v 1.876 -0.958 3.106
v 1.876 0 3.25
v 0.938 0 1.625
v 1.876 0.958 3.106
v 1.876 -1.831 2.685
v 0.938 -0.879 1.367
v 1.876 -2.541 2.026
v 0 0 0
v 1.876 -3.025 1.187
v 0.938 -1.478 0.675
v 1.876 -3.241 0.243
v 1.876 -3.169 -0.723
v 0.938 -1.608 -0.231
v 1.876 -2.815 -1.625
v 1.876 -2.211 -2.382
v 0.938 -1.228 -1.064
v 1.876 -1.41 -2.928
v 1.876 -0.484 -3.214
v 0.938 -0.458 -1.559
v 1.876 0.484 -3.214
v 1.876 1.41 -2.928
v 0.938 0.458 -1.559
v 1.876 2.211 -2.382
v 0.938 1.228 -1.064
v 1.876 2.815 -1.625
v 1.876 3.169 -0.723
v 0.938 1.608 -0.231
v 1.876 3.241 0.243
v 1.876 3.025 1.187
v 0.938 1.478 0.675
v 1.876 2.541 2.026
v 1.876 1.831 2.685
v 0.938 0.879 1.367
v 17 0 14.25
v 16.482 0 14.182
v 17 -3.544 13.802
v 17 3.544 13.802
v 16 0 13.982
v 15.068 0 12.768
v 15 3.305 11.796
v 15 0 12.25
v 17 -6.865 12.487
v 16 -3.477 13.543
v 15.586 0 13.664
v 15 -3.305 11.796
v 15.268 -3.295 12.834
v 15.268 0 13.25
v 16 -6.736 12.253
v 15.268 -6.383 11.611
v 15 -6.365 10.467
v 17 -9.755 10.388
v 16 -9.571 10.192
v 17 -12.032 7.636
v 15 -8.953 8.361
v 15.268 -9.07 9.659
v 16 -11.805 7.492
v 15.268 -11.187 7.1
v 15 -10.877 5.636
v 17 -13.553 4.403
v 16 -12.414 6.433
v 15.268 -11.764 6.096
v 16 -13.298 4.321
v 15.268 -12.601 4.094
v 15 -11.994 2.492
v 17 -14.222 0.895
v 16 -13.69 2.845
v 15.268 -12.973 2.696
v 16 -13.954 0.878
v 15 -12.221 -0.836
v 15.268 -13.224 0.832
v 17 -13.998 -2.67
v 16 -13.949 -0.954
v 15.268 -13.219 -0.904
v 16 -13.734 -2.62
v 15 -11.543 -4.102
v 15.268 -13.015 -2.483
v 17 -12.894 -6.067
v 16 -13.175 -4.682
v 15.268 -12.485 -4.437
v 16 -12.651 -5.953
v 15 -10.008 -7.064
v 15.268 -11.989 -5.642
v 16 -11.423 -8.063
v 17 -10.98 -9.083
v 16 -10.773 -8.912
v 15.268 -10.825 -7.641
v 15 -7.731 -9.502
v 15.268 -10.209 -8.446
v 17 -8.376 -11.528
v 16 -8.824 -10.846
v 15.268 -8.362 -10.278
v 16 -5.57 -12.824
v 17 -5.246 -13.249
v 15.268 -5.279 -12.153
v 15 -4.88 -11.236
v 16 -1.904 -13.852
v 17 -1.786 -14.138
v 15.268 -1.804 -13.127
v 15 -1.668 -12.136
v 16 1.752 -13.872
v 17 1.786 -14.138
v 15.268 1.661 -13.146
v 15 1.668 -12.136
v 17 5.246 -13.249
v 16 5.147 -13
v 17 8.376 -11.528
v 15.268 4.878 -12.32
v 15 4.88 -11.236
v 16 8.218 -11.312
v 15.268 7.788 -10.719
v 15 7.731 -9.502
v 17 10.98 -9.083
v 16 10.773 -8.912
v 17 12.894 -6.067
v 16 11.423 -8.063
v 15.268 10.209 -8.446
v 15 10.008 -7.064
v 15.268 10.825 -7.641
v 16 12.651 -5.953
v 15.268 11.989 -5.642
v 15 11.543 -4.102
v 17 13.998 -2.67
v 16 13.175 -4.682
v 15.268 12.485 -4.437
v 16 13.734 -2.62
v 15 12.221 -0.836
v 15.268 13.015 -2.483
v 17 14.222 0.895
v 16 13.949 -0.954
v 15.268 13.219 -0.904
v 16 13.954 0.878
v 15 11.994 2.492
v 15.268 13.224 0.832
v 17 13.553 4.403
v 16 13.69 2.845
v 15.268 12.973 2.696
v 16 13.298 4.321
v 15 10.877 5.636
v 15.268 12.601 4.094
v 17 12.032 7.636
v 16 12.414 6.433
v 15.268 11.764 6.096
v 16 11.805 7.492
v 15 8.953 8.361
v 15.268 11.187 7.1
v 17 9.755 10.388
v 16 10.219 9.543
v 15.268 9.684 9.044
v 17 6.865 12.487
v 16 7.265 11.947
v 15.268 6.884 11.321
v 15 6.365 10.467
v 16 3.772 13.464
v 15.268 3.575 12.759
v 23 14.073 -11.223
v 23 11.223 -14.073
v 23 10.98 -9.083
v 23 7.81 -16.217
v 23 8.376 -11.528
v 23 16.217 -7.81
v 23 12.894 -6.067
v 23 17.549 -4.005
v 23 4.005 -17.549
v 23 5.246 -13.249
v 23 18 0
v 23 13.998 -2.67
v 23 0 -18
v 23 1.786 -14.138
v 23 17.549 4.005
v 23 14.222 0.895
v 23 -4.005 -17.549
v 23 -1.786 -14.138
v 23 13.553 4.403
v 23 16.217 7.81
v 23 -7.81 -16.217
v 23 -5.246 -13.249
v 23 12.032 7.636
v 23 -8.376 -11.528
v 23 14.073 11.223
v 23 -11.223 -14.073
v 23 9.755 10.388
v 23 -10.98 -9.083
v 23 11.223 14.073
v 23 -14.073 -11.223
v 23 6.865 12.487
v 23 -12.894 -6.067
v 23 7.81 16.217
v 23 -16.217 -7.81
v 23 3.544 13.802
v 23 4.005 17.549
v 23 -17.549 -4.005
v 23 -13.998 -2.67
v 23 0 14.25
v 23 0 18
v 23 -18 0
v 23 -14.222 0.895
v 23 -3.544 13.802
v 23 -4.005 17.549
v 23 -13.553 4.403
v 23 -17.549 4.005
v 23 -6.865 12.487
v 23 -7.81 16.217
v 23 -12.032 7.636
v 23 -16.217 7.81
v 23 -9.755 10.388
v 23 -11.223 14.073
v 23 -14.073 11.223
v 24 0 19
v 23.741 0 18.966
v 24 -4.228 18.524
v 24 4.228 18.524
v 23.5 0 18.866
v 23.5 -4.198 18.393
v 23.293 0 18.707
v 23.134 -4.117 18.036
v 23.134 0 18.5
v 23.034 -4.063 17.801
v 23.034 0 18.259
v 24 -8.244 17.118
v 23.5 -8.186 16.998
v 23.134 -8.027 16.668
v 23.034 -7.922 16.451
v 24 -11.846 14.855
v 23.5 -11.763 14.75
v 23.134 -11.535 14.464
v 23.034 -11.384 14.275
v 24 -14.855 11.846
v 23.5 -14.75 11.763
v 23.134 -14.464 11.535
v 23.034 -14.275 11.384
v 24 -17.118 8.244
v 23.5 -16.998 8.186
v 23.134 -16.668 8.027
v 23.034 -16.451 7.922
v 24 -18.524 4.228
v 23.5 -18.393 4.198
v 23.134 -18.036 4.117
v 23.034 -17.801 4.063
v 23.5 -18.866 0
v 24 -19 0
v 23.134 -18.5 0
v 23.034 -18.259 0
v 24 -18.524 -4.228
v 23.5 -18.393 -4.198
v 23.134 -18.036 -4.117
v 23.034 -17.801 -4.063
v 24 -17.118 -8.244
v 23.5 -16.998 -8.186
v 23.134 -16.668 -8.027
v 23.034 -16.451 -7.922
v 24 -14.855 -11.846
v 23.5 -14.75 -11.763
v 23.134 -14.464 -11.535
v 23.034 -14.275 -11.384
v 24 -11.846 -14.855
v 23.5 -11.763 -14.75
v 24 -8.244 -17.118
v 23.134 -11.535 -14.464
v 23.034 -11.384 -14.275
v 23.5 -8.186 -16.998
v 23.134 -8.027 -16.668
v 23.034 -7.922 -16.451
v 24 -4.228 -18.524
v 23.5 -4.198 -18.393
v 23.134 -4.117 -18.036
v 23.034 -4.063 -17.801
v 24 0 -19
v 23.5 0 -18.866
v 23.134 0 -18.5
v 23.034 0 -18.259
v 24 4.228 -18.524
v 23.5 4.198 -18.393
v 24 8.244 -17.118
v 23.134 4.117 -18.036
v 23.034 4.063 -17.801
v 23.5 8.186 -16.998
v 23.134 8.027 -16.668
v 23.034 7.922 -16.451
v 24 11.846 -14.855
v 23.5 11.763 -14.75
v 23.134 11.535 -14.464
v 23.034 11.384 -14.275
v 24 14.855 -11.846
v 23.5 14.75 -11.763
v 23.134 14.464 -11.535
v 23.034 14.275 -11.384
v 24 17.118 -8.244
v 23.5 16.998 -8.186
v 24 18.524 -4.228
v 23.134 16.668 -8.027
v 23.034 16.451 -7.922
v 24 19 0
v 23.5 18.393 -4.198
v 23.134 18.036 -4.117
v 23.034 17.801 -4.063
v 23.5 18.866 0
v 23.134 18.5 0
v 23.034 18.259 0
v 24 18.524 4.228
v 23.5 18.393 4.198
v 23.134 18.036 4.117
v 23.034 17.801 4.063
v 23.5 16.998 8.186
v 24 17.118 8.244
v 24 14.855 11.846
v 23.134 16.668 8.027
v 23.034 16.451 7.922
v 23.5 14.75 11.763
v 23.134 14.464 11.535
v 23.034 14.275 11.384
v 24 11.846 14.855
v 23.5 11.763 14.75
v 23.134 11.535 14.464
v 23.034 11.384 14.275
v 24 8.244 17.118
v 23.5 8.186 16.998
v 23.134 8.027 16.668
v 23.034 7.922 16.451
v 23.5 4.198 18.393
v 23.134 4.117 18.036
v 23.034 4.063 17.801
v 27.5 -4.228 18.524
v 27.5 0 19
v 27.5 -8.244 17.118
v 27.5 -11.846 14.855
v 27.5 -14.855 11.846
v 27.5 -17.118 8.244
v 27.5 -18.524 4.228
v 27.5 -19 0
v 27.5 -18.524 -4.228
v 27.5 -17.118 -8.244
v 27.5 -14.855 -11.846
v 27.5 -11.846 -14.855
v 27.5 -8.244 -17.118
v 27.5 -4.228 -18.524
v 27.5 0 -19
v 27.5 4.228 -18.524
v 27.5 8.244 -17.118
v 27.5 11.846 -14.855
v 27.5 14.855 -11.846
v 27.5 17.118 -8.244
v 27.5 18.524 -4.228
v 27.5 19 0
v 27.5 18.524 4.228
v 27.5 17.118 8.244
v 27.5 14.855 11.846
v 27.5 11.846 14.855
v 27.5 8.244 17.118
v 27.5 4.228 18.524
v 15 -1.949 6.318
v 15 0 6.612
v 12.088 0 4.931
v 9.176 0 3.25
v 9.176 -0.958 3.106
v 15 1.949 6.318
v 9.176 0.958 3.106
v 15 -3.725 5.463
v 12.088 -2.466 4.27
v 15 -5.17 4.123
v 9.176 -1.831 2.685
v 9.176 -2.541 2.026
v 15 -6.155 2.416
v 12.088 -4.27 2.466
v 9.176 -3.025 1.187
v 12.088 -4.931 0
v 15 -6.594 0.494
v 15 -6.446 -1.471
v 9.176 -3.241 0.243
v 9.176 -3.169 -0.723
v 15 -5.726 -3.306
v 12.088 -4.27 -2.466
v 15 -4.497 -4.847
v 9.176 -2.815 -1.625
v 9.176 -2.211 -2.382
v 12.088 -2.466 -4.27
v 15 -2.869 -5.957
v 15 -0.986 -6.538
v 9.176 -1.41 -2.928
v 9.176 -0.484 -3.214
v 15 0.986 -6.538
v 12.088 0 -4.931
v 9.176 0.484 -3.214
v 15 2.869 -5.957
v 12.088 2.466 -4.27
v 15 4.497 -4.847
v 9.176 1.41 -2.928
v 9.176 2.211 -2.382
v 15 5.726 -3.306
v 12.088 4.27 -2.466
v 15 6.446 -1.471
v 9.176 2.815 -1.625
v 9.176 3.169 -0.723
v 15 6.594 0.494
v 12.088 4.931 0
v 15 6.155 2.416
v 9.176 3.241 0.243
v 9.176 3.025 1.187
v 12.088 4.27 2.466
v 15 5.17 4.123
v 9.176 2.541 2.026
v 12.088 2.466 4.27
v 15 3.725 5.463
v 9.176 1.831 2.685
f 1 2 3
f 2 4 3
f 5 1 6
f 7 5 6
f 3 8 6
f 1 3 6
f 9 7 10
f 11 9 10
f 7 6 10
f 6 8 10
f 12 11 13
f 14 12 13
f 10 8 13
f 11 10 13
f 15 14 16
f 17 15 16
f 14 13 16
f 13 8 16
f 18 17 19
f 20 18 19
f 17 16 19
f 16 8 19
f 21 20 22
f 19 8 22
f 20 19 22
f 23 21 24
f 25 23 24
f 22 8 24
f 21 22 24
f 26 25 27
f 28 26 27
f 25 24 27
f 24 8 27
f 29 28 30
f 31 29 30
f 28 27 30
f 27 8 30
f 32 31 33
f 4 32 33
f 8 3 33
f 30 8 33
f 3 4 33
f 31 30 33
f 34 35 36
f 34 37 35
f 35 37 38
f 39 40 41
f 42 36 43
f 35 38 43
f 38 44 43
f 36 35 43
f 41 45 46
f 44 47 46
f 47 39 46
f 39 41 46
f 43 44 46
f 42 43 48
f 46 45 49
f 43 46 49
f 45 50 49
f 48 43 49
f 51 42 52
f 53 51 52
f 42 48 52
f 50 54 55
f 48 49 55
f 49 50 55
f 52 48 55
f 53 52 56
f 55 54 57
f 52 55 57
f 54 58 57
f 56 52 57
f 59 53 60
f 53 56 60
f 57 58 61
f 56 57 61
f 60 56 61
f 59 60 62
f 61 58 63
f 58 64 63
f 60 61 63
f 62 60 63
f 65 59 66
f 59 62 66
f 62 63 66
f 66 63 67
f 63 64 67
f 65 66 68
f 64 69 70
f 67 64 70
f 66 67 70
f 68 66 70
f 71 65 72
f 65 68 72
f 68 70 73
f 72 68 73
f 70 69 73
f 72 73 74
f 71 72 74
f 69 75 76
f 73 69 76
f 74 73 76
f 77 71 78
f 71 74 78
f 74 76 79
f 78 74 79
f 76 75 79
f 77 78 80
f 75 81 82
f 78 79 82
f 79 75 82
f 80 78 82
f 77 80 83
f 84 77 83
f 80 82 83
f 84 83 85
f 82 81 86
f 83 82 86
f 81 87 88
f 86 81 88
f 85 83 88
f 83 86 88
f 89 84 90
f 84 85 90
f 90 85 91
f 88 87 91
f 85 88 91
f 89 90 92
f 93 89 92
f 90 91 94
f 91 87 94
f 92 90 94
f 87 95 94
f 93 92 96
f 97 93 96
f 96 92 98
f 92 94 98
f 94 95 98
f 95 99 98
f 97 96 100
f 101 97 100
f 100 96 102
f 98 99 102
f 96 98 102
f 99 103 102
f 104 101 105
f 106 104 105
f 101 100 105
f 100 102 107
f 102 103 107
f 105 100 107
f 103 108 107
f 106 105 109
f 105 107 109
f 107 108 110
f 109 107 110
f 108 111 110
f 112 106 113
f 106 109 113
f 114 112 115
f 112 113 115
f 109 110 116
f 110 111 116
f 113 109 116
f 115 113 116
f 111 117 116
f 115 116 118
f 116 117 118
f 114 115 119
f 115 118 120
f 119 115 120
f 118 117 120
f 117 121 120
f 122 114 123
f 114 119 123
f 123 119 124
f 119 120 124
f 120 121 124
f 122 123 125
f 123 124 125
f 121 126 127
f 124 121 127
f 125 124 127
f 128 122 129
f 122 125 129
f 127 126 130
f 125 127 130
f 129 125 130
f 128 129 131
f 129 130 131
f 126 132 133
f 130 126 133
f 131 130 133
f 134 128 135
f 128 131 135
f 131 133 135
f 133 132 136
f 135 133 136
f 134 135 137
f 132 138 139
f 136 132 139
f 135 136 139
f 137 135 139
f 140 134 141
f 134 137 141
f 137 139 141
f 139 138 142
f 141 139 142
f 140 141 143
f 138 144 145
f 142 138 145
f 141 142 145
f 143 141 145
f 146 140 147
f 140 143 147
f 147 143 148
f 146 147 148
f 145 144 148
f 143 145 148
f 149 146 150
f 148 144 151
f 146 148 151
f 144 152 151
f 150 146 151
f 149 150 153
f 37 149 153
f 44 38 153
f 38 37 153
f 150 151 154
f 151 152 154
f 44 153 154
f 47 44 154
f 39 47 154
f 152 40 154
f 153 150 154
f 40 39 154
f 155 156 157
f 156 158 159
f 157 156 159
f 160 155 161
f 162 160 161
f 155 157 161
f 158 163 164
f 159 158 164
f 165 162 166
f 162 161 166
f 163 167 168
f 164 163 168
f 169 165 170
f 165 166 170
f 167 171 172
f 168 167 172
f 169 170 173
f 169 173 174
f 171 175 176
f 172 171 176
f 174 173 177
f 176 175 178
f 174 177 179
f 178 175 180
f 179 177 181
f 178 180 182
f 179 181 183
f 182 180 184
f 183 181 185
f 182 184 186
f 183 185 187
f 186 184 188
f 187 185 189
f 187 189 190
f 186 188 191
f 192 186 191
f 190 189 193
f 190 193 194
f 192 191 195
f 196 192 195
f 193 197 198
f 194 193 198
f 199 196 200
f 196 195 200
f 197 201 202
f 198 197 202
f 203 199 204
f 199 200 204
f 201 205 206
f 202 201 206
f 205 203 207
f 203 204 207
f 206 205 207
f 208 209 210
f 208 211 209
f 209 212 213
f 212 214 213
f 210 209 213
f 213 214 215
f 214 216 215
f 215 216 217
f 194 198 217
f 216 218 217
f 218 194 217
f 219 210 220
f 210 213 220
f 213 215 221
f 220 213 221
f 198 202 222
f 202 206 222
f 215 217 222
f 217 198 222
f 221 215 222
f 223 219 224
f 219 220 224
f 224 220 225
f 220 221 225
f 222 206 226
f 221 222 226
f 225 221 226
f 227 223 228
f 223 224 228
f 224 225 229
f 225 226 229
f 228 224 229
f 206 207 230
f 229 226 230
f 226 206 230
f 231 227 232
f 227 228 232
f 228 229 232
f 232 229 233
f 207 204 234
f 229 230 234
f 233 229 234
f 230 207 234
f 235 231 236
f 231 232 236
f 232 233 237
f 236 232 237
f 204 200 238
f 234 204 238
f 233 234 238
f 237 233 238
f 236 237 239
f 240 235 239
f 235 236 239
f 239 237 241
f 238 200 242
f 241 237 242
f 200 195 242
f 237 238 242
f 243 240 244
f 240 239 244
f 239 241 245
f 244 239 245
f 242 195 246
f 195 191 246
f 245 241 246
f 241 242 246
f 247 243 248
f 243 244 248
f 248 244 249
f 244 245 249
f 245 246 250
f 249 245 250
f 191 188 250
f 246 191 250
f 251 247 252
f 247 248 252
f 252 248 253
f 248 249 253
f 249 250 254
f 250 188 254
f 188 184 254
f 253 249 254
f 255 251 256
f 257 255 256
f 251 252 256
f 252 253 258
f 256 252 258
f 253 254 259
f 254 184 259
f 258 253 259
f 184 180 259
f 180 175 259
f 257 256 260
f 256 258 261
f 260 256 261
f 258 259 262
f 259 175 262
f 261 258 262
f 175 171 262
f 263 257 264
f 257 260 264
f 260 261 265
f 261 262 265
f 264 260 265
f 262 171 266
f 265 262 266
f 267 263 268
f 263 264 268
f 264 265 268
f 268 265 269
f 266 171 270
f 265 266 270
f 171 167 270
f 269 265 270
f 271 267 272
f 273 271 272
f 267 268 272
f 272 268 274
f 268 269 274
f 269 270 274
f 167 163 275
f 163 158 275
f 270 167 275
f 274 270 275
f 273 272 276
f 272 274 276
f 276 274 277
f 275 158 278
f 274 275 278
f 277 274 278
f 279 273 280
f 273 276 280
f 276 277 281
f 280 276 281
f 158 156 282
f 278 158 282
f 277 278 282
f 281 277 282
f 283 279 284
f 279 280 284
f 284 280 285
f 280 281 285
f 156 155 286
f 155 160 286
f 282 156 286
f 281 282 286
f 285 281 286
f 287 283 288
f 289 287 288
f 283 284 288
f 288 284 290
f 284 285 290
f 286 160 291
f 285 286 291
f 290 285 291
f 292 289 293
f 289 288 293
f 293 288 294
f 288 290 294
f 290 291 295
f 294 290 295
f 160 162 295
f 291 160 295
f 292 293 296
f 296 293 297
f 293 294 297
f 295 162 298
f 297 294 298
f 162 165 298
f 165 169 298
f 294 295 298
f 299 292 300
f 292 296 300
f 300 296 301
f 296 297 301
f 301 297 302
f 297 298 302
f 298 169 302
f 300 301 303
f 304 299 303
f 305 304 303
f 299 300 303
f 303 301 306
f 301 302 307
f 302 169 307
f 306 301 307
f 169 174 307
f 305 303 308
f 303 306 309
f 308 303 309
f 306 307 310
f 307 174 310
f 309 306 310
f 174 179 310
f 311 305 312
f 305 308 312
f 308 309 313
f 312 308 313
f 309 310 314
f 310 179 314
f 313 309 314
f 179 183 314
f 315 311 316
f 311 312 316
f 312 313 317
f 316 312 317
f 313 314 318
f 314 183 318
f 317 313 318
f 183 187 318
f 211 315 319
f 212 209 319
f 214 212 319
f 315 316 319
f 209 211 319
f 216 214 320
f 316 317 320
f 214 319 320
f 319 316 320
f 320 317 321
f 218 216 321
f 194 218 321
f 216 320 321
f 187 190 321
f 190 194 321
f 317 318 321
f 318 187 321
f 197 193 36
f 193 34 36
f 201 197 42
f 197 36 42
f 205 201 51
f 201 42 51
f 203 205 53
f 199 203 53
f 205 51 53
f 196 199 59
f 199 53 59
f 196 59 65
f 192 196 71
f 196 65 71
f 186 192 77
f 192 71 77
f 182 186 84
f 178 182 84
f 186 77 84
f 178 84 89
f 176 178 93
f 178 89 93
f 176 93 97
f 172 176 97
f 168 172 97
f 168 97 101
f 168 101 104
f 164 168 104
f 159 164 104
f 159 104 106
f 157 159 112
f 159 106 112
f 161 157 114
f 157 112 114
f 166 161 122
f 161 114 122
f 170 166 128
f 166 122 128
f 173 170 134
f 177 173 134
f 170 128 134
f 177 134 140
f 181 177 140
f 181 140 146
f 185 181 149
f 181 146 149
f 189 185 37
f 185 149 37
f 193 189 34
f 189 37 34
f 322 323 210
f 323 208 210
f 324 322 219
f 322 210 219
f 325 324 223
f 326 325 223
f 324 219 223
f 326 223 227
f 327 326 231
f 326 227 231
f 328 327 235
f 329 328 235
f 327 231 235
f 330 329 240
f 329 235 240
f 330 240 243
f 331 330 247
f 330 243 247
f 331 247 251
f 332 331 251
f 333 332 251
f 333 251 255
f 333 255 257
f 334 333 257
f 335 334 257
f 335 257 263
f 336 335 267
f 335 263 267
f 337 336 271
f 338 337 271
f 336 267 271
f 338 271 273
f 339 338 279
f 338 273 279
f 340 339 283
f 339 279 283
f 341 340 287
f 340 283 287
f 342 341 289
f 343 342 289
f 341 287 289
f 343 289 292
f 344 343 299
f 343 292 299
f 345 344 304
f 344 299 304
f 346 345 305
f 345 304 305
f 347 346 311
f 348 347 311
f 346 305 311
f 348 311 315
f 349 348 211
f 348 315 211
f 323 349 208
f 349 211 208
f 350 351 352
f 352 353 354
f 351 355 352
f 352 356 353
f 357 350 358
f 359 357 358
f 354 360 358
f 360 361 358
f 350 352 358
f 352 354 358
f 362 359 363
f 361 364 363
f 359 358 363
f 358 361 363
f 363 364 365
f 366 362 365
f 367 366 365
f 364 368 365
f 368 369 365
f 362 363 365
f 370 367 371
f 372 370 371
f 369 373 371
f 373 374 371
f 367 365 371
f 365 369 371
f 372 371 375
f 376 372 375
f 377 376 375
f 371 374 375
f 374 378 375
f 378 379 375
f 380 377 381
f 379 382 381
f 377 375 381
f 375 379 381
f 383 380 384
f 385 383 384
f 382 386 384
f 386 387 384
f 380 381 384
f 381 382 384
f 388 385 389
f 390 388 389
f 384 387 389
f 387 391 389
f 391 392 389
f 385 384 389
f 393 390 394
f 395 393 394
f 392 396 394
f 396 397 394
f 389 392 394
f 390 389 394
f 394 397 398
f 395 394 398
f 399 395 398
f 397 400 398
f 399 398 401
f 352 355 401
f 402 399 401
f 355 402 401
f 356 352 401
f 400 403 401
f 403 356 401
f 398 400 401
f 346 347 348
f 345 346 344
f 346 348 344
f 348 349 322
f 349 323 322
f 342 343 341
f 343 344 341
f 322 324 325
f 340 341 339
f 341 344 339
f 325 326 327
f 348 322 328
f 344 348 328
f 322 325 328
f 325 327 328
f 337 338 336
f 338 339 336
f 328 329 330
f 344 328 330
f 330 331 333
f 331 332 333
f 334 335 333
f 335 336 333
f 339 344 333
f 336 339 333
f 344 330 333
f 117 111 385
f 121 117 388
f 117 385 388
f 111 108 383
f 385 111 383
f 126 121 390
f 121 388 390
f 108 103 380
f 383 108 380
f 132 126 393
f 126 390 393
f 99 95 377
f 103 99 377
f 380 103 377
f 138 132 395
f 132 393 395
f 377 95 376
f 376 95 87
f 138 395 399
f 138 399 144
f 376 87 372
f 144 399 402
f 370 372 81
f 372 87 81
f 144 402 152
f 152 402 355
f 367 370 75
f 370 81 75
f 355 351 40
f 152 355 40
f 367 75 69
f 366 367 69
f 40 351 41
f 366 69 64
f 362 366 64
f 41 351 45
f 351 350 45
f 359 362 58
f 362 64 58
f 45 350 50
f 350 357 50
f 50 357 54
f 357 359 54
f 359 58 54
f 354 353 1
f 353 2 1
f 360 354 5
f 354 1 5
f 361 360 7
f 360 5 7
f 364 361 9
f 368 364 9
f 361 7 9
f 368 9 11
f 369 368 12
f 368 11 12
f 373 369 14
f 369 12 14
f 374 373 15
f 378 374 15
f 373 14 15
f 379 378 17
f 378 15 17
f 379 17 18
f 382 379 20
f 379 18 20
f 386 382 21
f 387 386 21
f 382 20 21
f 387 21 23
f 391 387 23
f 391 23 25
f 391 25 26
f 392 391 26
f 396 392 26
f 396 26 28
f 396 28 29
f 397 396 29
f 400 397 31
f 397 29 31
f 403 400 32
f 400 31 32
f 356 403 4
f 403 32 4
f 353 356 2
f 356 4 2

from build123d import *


with BuildPart() as f1:
    # F0 (on Front) → F1 (revolve)
    with BuildSketch(Plane.XZ):
        with BuildLine():
            Line((27.5, 0), (27.5, 19))
            Line((27.5, 19), (24, 19))
            ThreePointArc((24, 19), (23.292893, 18.707107), (23, 18))
            Line((23, 18), (23, 14.25))
            Line((23, 14.25), (17, 14.25))
            ThreePointArc((17, 14.25), (15.585786, 13.664214), (15, 12.25))
            Line((15, 12.25), (15, 6.612264))
            Line((15, 6.612264), (9.176388, 3.25))
            Line((9.176388, 3.25), (1.876388, 3.25))
            Line((1.876388, 3.25), (0, 0))
            Line((0, 0), (27.5, 0))
        make_face()
    revolve(axis=Axis((13.75, 0, 0), (1, 0, 0)))


solid = f1.part
